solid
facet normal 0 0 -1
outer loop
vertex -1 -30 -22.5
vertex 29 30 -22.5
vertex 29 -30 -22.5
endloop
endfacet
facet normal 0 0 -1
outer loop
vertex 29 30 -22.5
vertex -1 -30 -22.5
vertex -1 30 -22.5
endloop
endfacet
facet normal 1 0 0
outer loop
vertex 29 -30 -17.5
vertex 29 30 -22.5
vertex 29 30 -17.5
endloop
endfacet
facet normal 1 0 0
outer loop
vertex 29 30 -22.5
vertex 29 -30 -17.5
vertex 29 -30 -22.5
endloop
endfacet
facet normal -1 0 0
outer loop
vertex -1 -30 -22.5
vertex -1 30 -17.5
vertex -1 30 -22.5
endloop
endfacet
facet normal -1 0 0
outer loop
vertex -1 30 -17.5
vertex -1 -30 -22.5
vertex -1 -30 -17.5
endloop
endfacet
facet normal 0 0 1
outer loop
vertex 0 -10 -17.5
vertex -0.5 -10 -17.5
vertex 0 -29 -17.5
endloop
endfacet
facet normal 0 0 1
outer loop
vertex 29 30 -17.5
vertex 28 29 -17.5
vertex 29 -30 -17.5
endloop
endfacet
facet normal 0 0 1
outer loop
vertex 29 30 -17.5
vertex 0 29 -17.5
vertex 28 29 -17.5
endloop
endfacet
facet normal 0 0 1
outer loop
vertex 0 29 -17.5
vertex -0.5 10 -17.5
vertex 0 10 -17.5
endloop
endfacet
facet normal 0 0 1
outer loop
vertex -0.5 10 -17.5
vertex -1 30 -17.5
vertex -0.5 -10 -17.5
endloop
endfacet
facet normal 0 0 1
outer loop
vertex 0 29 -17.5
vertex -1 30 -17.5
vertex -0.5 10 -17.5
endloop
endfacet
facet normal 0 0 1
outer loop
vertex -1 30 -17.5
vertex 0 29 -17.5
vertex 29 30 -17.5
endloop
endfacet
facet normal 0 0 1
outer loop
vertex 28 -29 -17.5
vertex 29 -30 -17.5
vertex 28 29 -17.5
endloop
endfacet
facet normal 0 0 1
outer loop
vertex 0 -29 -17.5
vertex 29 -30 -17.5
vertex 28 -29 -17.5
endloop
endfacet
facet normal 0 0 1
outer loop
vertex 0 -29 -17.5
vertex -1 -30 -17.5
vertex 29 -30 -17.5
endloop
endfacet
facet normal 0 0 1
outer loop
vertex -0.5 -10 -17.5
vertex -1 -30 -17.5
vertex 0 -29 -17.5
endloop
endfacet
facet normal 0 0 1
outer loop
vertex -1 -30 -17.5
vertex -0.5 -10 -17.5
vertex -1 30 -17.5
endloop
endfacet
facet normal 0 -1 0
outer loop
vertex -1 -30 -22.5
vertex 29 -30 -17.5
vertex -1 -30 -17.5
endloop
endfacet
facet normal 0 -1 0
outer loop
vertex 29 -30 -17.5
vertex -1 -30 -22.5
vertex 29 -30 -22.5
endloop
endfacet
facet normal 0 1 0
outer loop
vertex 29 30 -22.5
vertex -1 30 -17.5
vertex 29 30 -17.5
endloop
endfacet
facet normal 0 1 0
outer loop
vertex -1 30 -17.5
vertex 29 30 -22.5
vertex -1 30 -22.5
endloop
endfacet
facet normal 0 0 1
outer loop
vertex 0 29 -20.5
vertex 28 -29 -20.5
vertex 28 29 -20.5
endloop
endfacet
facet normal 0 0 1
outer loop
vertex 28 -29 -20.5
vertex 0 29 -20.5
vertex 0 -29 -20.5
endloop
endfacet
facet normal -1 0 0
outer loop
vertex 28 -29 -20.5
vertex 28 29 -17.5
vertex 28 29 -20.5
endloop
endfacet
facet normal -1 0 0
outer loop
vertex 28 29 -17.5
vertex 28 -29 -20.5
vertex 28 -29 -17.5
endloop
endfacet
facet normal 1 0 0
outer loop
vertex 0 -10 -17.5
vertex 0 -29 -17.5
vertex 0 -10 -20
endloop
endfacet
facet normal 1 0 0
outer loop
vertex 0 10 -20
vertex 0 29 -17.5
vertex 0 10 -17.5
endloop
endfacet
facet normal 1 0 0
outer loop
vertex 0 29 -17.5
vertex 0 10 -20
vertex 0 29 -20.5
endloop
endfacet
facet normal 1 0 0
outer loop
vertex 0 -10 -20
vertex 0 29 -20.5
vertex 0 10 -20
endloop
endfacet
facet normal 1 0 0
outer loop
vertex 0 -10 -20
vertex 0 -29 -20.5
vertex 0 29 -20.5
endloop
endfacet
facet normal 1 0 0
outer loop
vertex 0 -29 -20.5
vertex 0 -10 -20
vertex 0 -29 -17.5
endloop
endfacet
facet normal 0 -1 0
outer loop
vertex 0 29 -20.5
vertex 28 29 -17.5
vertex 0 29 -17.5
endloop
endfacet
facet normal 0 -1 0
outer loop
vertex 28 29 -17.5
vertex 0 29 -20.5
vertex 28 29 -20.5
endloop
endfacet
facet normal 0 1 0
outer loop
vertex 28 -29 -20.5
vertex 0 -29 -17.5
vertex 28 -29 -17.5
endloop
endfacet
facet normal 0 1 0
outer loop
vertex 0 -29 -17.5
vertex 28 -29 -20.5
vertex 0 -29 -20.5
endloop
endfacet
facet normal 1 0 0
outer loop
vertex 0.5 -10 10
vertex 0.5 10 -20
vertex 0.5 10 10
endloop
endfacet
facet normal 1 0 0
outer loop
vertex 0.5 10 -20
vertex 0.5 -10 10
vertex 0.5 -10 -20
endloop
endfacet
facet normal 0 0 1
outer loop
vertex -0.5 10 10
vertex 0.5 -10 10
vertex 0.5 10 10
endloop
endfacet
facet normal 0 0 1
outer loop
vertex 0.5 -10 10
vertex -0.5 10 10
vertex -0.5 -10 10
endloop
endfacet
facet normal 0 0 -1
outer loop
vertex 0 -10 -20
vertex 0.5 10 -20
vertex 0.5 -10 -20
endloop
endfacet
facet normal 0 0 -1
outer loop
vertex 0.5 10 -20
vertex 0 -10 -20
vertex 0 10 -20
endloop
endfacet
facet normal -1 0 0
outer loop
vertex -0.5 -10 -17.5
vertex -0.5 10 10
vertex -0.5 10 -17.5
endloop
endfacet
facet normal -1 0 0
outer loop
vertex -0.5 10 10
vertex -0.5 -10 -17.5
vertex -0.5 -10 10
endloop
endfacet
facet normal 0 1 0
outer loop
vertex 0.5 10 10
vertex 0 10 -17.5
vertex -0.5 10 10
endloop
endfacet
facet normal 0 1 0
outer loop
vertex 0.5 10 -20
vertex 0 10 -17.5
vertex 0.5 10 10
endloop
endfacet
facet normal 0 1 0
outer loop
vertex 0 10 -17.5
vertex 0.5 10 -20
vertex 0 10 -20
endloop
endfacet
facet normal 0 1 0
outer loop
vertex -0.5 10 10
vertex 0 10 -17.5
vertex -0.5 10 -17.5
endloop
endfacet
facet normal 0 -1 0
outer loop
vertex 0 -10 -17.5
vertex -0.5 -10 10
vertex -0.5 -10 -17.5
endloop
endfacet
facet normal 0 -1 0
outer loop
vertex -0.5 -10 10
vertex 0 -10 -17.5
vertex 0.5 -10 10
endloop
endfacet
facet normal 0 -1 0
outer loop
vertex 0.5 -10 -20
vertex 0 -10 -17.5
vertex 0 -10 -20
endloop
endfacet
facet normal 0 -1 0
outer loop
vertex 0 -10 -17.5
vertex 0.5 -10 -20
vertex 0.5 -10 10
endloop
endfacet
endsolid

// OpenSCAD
// [FL_INDEX: keywords="openscad, 3d_parametric, Customizable_Phone_Charging_Hangar, csg_solid" | COT="Parametric OpenSCAD design from 3DCodeverse"]
// Title: Customizable Phone Charging Hangar

/*
A hanger for your mobile phone while it is charging.
Date: 19/11/2013
*/

//Frame for connecting the platform with the hook
translate([0,0,-5])
cube(size = [1,20,30], center = true);
//Change Hole radius parameters between 1-14
hole_radius = 15; //[5:14]
//Hook which goes around the charger
difference(){
translate([0,0,17])
rotate([90,0,90])
cylinder(h = 1, r = 15, center = true);

translate([0,0,17])
rotate([90,0,90])
cylinder(h = 1, r = hole_radius, center = true);
}
//Change base width
outer_width = 60;
//Change base length
outer_length = 30;

//Hollowed out base to place phone
difference(){
translate([14,0,-20])
rotate([0,90,0])
cube(size = [5,outer_width,outer_length], center = true);

translate([14,0,-19])
rotate([0,90,0])
cube(size = [3,outer_width-2,outer_length-2], center = true);
}
